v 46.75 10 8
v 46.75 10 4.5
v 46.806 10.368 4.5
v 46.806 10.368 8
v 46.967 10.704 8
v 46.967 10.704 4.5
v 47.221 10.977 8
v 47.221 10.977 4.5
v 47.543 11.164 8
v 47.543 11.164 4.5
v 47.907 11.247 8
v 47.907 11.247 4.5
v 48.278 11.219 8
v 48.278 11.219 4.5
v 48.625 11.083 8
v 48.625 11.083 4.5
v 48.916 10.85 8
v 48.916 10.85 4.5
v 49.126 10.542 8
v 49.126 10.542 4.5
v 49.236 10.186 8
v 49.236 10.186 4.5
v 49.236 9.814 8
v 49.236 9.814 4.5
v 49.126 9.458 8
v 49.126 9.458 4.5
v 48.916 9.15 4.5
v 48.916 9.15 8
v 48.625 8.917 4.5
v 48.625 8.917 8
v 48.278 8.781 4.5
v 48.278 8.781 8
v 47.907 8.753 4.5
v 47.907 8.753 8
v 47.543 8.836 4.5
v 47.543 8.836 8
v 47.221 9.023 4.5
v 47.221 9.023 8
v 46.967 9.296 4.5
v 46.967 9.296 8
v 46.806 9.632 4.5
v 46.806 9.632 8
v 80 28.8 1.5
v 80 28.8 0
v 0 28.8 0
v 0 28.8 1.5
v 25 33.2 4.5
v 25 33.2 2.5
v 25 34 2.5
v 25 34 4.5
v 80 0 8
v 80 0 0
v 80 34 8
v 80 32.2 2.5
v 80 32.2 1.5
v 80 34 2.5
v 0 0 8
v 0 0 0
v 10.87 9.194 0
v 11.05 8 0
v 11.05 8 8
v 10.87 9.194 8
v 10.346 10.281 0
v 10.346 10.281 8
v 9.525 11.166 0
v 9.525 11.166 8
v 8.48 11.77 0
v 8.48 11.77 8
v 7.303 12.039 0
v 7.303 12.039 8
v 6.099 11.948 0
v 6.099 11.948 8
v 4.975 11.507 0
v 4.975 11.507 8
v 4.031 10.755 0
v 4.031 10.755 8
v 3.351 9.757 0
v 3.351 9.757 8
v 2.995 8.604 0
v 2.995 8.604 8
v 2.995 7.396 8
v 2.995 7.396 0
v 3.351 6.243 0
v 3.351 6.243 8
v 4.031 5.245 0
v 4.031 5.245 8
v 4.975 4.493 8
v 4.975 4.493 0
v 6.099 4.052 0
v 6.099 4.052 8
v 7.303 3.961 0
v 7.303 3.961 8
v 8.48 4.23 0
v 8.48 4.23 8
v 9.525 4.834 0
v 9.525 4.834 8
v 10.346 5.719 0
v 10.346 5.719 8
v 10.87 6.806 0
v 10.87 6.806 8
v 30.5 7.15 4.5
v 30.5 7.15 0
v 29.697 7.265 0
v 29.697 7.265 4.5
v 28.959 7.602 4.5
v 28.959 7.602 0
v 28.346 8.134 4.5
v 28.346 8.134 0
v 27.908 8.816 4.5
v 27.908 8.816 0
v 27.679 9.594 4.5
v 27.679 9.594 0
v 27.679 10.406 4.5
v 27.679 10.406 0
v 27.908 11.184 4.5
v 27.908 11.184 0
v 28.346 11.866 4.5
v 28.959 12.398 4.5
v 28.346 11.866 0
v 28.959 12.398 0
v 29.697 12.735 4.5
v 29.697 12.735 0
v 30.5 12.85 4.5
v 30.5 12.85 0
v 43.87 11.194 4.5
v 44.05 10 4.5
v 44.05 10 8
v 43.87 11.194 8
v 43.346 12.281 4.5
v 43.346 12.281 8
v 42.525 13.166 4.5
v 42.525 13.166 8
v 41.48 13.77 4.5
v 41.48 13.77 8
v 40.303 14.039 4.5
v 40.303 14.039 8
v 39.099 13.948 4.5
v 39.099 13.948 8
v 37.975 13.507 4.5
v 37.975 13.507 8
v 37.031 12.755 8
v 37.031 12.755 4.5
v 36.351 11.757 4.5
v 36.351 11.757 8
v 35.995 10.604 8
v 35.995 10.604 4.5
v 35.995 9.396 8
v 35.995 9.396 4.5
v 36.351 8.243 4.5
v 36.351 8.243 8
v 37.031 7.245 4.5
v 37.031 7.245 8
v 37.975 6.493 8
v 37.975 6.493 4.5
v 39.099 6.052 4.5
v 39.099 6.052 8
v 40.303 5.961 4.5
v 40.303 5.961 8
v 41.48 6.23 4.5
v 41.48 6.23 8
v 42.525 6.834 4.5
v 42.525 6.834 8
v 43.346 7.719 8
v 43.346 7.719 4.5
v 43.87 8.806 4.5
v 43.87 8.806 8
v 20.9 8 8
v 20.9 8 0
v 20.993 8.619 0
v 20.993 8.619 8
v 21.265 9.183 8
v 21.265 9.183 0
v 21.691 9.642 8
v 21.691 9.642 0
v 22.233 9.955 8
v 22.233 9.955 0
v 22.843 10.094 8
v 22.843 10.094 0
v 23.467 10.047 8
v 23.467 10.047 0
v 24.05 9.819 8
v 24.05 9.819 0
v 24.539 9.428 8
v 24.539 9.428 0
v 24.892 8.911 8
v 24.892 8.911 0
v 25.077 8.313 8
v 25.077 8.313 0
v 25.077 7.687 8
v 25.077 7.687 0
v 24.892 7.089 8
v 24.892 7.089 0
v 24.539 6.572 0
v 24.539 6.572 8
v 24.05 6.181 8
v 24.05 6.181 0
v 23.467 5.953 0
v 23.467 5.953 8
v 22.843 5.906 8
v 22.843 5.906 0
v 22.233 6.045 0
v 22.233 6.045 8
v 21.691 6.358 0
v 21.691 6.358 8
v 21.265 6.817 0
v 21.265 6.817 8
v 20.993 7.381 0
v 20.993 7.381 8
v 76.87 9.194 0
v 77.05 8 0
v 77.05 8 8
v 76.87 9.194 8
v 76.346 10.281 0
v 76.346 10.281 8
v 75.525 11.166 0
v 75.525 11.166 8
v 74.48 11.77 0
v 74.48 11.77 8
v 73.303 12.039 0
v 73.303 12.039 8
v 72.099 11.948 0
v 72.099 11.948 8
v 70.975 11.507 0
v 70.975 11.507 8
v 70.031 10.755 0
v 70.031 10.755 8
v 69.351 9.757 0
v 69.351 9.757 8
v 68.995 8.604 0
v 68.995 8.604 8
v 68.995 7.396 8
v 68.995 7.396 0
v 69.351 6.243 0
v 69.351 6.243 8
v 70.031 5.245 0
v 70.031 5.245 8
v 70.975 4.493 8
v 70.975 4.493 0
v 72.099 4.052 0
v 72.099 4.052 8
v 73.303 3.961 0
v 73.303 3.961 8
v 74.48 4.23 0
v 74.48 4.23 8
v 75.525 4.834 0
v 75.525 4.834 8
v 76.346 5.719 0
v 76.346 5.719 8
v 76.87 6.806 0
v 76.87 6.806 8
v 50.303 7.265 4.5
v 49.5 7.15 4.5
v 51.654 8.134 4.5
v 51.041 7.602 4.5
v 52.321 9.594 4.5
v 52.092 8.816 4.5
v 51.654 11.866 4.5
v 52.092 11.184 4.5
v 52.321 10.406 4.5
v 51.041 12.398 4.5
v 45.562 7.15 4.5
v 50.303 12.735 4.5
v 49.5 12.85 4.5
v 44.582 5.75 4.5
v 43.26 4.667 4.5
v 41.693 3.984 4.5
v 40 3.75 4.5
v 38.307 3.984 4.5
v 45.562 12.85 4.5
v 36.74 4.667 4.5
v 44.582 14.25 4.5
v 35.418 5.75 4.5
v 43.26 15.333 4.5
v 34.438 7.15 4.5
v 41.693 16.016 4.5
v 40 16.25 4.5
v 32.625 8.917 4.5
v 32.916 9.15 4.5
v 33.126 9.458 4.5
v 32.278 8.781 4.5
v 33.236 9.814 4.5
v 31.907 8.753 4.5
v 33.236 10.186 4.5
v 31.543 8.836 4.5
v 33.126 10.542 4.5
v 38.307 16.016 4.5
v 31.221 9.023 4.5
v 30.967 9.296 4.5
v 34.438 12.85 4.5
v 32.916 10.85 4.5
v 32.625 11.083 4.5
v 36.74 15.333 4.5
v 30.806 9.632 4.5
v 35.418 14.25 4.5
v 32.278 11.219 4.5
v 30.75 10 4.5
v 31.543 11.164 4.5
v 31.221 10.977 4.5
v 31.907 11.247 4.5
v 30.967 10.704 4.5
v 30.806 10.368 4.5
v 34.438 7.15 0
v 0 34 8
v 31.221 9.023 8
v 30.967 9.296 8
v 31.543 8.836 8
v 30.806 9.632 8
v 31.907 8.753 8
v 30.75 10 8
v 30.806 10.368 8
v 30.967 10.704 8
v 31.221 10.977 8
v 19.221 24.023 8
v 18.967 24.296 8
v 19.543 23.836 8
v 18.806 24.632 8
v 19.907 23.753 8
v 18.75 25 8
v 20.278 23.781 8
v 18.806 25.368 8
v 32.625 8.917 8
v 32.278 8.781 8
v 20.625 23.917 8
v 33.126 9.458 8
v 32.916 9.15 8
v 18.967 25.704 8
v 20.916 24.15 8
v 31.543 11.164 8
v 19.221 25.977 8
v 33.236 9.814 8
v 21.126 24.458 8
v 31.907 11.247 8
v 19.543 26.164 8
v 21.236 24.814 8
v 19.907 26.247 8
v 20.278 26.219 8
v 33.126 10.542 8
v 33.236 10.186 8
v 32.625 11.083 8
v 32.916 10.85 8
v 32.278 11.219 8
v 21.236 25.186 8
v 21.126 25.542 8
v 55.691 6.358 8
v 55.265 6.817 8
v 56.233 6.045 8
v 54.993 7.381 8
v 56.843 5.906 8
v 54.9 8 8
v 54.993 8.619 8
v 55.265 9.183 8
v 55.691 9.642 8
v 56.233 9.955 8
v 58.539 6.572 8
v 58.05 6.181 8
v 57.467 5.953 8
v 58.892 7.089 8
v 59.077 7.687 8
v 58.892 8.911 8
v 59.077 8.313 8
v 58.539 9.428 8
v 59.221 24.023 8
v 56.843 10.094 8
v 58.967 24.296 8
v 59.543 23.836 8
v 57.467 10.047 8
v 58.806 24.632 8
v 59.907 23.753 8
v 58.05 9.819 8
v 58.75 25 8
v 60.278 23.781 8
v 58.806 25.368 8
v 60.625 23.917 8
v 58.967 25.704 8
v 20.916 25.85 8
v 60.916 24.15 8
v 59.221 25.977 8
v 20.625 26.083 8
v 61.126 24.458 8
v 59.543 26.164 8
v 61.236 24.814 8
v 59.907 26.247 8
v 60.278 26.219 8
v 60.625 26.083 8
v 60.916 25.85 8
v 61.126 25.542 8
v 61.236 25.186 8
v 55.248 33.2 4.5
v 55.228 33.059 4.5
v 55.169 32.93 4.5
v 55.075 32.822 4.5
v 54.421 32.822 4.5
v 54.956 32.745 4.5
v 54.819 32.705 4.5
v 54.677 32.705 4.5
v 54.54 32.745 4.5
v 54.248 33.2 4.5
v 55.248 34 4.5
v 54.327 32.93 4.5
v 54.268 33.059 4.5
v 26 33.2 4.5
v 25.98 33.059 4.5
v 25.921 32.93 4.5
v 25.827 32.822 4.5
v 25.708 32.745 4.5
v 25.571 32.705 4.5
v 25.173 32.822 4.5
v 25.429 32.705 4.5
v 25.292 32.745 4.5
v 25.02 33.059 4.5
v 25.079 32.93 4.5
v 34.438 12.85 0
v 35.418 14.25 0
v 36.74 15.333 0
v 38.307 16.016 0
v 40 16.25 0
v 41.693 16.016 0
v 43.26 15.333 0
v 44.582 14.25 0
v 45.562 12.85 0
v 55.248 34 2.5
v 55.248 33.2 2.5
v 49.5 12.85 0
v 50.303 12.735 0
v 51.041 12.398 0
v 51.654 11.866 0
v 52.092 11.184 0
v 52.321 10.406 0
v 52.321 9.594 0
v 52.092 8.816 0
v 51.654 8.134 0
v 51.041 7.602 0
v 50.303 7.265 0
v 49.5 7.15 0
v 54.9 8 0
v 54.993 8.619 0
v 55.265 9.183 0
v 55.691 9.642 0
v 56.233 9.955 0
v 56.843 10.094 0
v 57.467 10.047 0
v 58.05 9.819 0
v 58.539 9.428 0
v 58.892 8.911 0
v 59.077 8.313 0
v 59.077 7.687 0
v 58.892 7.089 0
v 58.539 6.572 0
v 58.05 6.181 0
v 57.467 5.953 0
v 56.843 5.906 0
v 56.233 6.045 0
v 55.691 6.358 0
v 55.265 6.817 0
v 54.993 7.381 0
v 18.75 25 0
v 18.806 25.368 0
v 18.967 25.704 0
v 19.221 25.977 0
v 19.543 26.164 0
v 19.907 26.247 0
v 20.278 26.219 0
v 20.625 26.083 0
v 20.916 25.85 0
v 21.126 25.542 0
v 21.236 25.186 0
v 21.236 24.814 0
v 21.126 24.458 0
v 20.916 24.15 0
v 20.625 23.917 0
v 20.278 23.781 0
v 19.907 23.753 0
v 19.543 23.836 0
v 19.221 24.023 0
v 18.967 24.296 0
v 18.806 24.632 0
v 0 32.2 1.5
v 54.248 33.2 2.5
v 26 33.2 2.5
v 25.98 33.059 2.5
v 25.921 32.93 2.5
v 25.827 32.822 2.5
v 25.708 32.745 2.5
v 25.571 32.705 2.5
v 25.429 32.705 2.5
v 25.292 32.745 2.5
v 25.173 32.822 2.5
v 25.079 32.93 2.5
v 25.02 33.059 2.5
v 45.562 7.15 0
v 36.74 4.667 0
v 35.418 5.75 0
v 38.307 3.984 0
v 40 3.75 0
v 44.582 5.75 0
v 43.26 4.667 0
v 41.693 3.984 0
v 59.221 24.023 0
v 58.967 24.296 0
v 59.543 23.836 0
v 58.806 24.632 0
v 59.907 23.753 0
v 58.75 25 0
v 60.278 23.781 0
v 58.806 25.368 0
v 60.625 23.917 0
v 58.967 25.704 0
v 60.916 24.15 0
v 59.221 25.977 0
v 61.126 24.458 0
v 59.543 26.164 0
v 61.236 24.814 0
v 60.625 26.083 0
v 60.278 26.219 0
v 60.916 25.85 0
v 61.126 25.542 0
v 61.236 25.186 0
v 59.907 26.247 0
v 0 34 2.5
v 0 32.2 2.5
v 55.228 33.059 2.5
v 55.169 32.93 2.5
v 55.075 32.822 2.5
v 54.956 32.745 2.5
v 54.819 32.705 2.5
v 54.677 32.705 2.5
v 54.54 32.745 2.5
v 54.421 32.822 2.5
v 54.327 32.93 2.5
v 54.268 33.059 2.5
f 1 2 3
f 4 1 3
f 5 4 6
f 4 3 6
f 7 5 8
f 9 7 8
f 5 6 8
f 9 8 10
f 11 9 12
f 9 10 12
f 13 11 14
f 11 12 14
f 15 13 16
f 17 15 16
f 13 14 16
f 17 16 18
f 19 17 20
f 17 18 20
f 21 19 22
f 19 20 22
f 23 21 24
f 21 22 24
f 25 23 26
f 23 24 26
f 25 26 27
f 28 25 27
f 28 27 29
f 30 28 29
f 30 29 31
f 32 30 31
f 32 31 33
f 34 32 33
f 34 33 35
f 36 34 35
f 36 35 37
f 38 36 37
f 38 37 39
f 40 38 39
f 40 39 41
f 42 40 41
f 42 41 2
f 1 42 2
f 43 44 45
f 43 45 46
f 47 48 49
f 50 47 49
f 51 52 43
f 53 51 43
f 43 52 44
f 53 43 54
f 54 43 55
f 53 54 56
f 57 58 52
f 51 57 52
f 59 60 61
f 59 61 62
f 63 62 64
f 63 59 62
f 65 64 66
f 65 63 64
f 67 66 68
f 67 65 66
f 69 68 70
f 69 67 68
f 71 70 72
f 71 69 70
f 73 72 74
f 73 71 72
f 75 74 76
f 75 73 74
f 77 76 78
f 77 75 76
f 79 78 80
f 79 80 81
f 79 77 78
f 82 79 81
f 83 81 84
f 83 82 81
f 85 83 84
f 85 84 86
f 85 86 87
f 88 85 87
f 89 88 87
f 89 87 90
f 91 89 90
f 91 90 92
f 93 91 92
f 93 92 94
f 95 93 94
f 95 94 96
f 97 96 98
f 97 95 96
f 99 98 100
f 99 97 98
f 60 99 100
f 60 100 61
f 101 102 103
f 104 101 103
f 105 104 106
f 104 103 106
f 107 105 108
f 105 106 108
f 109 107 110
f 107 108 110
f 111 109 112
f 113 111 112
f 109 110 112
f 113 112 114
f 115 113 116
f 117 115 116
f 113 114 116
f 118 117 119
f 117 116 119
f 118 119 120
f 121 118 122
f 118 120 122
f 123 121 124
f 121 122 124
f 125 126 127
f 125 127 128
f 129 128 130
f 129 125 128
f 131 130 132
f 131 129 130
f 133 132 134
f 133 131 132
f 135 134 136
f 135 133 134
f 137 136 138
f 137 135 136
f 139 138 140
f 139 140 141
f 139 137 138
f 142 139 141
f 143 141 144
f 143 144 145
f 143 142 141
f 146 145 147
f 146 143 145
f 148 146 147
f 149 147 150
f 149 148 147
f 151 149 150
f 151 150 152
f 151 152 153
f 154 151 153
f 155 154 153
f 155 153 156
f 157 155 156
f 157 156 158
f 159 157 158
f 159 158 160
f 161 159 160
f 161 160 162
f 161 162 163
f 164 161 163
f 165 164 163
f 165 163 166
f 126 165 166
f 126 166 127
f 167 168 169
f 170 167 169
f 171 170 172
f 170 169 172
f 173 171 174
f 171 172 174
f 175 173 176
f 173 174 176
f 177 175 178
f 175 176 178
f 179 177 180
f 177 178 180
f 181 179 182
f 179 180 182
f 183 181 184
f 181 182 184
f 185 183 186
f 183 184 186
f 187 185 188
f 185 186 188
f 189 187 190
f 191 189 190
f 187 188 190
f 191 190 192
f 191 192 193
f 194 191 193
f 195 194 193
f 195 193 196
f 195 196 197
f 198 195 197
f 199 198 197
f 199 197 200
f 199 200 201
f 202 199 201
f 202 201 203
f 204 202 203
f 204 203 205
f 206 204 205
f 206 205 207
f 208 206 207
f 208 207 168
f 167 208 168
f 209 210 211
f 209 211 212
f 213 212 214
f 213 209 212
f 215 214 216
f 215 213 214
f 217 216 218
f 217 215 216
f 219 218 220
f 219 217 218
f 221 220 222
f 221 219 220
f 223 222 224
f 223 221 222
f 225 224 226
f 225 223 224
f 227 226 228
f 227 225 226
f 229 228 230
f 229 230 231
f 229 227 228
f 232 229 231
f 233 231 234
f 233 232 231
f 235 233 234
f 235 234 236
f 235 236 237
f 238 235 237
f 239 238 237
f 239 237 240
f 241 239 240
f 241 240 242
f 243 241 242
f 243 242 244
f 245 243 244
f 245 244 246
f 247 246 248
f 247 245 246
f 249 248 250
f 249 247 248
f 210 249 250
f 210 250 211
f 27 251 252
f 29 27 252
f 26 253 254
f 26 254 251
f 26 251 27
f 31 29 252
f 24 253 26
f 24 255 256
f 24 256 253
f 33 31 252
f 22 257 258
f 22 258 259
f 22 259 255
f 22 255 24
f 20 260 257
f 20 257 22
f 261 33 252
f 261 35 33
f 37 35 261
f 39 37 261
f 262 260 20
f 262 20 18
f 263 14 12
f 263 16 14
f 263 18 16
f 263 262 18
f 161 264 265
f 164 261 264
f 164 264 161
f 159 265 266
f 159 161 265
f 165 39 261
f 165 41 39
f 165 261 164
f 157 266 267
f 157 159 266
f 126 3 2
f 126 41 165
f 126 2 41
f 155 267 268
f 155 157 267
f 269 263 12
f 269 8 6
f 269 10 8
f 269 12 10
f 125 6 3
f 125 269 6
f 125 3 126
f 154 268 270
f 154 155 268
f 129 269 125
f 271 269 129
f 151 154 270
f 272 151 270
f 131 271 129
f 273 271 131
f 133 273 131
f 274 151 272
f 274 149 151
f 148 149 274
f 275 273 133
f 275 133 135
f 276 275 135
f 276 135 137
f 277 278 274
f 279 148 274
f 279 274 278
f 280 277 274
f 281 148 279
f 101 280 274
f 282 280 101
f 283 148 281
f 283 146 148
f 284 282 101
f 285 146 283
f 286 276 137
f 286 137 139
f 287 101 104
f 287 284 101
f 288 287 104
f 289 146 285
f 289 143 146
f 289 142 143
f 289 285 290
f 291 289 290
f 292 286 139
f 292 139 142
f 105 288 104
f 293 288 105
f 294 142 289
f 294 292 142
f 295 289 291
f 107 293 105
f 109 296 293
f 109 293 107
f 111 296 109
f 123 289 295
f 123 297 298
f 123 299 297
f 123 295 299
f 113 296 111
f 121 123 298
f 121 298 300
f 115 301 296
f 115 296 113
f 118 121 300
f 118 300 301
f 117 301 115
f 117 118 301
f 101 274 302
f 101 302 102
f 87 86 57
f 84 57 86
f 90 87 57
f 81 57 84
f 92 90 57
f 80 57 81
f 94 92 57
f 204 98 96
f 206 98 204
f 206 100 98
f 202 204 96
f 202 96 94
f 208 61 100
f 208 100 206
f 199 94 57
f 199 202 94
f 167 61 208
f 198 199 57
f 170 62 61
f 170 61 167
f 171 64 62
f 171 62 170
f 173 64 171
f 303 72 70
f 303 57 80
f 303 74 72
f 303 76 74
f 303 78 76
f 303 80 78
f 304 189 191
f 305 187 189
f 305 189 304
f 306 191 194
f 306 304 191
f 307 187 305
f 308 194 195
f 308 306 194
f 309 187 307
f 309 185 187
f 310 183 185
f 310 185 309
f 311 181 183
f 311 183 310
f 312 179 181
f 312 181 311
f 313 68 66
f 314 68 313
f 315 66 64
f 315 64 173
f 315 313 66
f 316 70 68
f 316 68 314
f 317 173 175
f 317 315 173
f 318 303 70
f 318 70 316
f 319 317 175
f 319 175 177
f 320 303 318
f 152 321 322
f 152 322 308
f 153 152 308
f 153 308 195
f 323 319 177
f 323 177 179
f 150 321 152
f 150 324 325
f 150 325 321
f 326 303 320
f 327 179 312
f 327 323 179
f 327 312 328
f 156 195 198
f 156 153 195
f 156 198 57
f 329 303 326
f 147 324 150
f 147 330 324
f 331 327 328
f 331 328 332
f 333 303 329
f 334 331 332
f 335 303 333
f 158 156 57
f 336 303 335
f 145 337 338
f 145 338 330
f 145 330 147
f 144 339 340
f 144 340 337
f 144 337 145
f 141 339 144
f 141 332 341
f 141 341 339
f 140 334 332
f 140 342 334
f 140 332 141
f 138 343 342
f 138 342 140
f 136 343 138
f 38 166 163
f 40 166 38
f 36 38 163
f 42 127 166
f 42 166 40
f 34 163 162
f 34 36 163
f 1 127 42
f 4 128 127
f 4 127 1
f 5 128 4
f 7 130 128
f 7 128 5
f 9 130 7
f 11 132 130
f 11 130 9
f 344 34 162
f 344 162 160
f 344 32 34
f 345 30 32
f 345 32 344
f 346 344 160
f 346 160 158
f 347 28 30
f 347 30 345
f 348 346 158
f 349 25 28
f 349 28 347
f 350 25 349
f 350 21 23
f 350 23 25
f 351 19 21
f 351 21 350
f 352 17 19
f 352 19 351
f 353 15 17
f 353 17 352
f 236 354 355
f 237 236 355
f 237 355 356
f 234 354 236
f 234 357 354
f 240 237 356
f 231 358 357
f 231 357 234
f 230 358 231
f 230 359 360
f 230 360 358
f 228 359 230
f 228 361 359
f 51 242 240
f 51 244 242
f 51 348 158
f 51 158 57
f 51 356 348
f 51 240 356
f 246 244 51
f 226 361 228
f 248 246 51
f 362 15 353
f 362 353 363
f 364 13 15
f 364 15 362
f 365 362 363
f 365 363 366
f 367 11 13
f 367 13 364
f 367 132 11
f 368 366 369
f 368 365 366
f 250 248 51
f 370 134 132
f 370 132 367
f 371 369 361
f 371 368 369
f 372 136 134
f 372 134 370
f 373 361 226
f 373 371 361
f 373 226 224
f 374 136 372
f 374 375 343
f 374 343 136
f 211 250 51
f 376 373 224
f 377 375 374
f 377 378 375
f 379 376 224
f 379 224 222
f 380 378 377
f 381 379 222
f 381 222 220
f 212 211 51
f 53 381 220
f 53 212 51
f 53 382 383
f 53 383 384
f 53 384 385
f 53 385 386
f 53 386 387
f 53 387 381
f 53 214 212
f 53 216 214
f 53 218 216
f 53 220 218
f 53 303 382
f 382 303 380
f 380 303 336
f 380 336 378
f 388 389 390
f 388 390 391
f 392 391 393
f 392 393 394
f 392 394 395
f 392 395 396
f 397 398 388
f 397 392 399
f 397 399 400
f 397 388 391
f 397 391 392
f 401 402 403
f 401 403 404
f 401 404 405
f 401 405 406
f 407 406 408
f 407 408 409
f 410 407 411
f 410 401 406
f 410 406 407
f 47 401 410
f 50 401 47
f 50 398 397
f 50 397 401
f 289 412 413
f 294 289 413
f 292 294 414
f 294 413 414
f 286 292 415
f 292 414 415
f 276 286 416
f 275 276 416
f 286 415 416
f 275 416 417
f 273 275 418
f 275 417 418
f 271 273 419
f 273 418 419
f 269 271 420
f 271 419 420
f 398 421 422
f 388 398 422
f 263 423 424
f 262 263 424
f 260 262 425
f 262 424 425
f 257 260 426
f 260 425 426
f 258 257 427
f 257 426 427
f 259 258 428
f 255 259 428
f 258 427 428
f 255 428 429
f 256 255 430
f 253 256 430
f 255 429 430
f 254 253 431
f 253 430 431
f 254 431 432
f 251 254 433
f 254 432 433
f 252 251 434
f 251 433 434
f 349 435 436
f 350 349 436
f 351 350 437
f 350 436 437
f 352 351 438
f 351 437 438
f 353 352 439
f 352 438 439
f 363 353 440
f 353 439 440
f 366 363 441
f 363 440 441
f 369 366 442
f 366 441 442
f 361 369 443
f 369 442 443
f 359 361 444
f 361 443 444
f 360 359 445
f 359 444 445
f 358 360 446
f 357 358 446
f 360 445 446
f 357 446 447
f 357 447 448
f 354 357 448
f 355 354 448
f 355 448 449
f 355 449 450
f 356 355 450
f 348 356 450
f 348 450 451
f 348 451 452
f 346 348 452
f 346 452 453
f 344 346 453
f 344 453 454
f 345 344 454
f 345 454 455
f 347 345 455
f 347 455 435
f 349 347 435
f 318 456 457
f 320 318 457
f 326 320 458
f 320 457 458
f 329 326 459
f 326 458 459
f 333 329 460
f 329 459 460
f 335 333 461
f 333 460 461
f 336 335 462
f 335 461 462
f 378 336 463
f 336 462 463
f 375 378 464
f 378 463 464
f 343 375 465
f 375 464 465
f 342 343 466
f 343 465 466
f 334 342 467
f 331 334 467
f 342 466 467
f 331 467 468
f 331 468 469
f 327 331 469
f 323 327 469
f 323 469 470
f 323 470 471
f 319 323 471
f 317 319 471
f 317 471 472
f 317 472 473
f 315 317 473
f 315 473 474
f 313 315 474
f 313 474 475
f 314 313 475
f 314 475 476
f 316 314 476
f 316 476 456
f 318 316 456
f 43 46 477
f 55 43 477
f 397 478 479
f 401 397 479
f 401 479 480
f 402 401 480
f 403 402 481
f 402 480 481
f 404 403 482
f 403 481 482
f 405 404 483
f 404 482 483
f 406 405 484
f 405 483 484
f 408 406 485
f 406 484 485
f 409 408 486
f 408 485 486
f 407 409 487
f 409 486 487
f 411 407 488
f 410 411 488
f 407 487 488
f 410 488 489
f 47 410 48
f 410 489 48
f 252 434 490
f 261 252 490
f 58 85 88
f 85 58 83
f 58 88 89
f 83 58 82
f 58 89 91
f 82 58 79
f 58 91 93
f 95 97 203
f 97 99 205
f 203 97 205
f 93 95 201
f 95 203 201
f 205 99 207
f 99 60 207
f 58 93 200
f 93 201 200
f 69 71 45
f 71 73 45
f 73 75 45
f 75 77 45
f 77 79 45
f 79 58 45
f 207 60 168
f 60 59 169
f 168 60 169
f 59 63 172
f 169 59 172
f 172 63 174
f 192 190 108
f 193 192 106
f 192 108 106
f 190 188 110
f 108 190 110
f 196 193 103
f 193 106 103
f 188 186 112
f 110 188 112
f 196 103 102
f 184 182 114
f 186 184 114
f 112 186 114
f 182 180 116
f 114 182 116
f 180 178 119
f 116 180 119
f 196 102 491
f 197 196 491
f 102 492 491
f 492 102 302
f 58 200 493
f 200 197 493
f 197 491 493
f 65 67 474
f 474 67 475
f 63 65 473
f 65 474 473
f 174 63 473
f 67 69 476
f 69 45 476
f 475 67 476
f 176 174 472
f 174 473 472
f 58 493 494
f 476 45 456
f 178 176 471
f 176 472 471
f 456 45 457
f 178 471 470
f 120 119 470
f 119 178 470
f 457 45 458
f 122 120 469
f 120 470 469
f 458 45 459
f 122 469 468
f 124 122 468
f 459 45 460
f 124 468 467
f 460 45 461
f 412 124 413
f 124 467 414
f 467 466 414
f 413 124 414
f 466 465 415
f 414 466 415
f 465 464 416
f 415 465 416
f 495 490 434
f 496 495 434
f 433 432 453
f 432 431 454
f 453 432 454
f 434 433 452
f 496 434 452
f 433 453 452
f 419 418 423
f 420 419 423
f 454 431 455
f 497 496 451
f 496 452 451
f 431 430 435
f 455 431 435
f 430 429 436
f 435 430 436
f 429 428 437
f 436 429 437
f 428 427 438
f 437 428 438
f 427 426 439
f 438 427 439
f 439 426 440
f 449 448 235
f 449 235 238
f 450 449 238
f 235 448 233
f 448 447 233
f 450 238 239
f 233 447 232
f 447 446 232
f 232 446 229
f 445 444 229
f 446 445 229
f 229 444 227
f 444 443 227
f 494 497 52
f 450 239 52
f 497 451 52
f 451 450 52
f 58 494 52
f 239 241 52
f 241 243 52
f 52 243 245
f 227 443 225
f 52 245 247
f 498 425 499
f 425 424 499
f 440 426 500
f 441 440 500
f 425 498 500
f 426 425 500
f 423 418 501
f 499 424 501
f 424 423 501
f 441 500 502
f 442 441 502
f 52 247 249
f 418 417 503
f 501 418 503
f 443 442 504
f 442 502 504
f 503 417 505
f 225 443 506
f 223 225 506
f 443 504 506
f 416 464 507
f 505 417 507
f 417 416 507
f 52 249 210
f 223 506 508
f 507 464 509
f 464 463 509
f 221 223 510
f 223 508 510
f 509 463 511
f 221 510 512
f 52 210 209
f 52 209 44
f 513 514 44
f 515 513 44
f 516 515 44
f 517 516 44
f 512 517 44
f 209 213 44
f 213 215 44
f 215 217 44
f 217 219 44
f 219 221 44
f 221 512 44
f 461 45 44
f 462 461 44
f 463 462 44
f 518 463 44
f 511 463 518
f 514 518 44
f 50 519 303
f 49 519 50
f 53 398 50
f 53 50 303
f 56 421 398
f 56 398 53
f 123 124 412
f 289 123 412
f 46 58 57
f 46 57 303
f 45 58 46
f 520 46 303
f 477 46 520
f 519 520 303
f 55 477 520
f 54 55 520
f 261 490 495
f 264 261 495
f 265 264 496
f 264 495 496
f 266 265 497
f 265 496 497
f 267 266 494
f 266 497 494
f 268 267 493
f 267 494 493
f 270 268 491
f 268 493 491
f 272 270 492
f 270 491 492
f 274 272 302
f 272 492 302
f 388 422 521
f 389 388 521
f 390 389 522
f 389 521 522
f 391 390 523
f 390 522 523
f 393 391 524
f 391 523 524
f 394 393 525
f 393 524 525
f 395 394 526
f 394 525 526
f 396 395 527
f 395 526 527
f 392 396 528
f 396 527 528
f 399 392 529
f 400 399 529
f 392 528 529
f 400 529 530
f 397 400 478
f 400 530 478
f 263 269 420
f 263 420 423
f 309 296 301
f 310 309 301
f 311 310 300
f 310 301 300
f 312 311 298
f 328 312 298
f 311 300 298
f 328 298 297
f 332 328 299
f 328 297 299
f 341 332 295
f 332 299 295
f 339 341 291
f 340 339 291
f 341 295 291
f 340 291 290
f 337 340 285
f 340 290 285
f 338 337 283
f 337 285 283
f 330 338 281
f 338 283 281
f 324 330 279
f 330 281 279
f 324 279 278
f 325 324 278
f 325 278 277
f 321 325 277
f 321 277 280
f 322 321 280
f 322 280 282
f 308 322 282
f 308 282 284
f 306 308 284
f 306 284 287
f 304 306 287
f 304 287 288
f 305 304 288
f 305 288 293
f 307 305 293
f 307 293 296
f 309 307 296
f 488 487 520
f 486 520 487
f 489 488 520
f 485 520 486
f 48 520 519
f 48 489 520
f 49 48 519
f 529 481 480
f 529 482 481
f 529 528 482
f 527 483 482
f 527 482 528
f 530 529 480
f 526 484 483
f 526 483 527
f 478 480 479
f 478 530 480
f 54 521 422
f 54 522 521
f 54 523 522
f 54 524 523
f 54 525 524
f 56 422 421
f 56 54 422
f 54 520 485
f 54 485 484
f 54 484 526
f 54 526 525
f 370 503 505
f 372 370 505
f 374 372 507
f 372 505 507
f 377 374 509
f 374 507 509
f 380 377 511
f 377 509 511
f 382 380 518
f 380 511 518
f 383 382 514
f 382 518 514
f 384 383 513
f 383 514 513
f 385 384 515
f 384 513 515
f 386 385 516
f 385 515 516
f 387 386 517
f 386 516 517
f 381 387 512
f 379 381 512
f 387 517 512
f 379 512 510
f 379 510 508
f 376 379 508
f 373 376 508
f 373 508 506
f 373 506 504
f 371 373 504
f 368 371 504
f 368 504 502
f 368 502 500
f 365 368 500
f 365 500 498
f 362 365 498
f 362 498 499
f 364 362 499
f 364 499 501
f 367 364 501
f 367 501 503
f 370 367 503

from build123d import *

# Parameters (mm, degrees)
SKETCH_2_W           = 80
SKETCH_2_H           = 34
SKETCH_2_R           = 4.05
EXTRUDE_1_DEPTH      = 8
CUT_EXTRUDE_2_DEPTH  = 88.292611371
CUT_EXTRUDE_12_DEPTH = 4.5
SKETCH_20_R          = 6.25
CUT_EXTRUDE_13_DEPTH = 4.5
CUT_EXTRUDE_11_DEPTH = 2
HOLE_WIZARD_M3_7_D   = 2.5
HOLE_WIZARD_M5_1_D   = 4.2


with BuildPart() as part:
    # 草图2 → 凸台-拉伸1 (new body)
    with BuildSketch(Plane.XY):
        with Locations((40, 17)):
            Rectangle(SKETCH_2_W, SKETCH_2_H)
        with Locations((7, 8)):
            Circle(SKETCH_2_R, mode=Mode.SUBTRACT)
        with Locations((40, 10)):
            Circle(SKETCH_2_R, mode=Mode.SUBTRACT)
        with Locations((73, 8)):
            Circle(SKETCH_2_R, mode=Mode.SUBTRACT)
    extrude(amount=EXTRUDE_1_DEPTH)

    # 草图4 → 切除-拉伸2 (cut, through all)
    with BuildSketch(Plane(origin=(80, 0, 0), x_dir=(0, 0, -1), z_dir=(1, 0, 0))):
        Polygon((-1.5, 32.2), (-2.5, 32.2), (-2.5, 34), (0, 34), (0, 28.8), (-1.5, 28.8), align=None)
    extrude(amount=-CUT_EXTRUDE_2_DEPTH, mode=Mode.SUBTRACT)

    # 草图8 → 切除-拉伸12 (cut)
    with BuildSketch(Plane(origin=(0, 0, 0), x_dir=(-1, 0, 0), z_dir=(0, 0, -1))):
        with BuildLine():
            Line((-30.5, 12.85), (-49.5, 12.85))
            ThreePointArc((-49.5, 12.85), (-52.35, 10), (-49.5, 7.15))
            Line((-49.5, 7.15), (-30.5, 7.15))
            ThreePointArc((-30.5, 7.15), (-27.65, 10), (-30.5, 12.85))
        make_face()
    extrude(amount=-CUT_EXTRUDE_12_DEPTH, mode=Mode.SUBTRACT)

    # 草图20 → 切除-拉伸13 (cut)
    with BuildSketch(Plane(origin=(0, 0, 0), x_dir=(-1, 0, 0), z_dir=(0, 0, -1))):
        with Locations((-40, 10)):
            Circle(SKETCH_20_R)
    extrude(amount=-CUT_EXTRUDE_13_DEPTH, mode=Mode.SUBTRACT)

    # 草图19 → 切除-拉伸11 (cut)
    with BuildSketch(Plane(origin=(0, 0, 2.5), x_dir=(-1, 0, 0), z_dir=(0, 0, -1))):
        with BuildLine():
            Line((-25, 34), (-55.247938178, 34))
            Line((-55.247938178, 34), (-55.247938178, 33.2))
            ThreePointArc((-55.247938178, 33.2), (-54.747938178, 32.7), (-54.247938178, 33.2))
            Line((-54.247938178, 33.2), (-26, 33.2))
            ThreePointArc((-26, 33.2), (-25.5, 32.7), (-25, 33.2))
            Line((-25, 33.2), (-25, 34))
        make_face()
    extrude(amount=-CUT_EXTRUDE_11_DEPTH, mode=Mode.SUBTRACT)

    # M3 螺纹孔7 (through all)
    with Locations(Plane.XY.offset(8)):
        with Locations((20, 25), (60, 25), (32, 10), (48, 10)):
            Hole(HOLE_WIZARD_M3_7_D / 2)

    # M5 螺纹孔1 (through all)
    with Locations(Plane.XY.offset(8)):
        with Locations((23, 8), (57, 8)):
            Hole(HOLE_WIZARD_M5_1_D / 2)


solid = part.part
